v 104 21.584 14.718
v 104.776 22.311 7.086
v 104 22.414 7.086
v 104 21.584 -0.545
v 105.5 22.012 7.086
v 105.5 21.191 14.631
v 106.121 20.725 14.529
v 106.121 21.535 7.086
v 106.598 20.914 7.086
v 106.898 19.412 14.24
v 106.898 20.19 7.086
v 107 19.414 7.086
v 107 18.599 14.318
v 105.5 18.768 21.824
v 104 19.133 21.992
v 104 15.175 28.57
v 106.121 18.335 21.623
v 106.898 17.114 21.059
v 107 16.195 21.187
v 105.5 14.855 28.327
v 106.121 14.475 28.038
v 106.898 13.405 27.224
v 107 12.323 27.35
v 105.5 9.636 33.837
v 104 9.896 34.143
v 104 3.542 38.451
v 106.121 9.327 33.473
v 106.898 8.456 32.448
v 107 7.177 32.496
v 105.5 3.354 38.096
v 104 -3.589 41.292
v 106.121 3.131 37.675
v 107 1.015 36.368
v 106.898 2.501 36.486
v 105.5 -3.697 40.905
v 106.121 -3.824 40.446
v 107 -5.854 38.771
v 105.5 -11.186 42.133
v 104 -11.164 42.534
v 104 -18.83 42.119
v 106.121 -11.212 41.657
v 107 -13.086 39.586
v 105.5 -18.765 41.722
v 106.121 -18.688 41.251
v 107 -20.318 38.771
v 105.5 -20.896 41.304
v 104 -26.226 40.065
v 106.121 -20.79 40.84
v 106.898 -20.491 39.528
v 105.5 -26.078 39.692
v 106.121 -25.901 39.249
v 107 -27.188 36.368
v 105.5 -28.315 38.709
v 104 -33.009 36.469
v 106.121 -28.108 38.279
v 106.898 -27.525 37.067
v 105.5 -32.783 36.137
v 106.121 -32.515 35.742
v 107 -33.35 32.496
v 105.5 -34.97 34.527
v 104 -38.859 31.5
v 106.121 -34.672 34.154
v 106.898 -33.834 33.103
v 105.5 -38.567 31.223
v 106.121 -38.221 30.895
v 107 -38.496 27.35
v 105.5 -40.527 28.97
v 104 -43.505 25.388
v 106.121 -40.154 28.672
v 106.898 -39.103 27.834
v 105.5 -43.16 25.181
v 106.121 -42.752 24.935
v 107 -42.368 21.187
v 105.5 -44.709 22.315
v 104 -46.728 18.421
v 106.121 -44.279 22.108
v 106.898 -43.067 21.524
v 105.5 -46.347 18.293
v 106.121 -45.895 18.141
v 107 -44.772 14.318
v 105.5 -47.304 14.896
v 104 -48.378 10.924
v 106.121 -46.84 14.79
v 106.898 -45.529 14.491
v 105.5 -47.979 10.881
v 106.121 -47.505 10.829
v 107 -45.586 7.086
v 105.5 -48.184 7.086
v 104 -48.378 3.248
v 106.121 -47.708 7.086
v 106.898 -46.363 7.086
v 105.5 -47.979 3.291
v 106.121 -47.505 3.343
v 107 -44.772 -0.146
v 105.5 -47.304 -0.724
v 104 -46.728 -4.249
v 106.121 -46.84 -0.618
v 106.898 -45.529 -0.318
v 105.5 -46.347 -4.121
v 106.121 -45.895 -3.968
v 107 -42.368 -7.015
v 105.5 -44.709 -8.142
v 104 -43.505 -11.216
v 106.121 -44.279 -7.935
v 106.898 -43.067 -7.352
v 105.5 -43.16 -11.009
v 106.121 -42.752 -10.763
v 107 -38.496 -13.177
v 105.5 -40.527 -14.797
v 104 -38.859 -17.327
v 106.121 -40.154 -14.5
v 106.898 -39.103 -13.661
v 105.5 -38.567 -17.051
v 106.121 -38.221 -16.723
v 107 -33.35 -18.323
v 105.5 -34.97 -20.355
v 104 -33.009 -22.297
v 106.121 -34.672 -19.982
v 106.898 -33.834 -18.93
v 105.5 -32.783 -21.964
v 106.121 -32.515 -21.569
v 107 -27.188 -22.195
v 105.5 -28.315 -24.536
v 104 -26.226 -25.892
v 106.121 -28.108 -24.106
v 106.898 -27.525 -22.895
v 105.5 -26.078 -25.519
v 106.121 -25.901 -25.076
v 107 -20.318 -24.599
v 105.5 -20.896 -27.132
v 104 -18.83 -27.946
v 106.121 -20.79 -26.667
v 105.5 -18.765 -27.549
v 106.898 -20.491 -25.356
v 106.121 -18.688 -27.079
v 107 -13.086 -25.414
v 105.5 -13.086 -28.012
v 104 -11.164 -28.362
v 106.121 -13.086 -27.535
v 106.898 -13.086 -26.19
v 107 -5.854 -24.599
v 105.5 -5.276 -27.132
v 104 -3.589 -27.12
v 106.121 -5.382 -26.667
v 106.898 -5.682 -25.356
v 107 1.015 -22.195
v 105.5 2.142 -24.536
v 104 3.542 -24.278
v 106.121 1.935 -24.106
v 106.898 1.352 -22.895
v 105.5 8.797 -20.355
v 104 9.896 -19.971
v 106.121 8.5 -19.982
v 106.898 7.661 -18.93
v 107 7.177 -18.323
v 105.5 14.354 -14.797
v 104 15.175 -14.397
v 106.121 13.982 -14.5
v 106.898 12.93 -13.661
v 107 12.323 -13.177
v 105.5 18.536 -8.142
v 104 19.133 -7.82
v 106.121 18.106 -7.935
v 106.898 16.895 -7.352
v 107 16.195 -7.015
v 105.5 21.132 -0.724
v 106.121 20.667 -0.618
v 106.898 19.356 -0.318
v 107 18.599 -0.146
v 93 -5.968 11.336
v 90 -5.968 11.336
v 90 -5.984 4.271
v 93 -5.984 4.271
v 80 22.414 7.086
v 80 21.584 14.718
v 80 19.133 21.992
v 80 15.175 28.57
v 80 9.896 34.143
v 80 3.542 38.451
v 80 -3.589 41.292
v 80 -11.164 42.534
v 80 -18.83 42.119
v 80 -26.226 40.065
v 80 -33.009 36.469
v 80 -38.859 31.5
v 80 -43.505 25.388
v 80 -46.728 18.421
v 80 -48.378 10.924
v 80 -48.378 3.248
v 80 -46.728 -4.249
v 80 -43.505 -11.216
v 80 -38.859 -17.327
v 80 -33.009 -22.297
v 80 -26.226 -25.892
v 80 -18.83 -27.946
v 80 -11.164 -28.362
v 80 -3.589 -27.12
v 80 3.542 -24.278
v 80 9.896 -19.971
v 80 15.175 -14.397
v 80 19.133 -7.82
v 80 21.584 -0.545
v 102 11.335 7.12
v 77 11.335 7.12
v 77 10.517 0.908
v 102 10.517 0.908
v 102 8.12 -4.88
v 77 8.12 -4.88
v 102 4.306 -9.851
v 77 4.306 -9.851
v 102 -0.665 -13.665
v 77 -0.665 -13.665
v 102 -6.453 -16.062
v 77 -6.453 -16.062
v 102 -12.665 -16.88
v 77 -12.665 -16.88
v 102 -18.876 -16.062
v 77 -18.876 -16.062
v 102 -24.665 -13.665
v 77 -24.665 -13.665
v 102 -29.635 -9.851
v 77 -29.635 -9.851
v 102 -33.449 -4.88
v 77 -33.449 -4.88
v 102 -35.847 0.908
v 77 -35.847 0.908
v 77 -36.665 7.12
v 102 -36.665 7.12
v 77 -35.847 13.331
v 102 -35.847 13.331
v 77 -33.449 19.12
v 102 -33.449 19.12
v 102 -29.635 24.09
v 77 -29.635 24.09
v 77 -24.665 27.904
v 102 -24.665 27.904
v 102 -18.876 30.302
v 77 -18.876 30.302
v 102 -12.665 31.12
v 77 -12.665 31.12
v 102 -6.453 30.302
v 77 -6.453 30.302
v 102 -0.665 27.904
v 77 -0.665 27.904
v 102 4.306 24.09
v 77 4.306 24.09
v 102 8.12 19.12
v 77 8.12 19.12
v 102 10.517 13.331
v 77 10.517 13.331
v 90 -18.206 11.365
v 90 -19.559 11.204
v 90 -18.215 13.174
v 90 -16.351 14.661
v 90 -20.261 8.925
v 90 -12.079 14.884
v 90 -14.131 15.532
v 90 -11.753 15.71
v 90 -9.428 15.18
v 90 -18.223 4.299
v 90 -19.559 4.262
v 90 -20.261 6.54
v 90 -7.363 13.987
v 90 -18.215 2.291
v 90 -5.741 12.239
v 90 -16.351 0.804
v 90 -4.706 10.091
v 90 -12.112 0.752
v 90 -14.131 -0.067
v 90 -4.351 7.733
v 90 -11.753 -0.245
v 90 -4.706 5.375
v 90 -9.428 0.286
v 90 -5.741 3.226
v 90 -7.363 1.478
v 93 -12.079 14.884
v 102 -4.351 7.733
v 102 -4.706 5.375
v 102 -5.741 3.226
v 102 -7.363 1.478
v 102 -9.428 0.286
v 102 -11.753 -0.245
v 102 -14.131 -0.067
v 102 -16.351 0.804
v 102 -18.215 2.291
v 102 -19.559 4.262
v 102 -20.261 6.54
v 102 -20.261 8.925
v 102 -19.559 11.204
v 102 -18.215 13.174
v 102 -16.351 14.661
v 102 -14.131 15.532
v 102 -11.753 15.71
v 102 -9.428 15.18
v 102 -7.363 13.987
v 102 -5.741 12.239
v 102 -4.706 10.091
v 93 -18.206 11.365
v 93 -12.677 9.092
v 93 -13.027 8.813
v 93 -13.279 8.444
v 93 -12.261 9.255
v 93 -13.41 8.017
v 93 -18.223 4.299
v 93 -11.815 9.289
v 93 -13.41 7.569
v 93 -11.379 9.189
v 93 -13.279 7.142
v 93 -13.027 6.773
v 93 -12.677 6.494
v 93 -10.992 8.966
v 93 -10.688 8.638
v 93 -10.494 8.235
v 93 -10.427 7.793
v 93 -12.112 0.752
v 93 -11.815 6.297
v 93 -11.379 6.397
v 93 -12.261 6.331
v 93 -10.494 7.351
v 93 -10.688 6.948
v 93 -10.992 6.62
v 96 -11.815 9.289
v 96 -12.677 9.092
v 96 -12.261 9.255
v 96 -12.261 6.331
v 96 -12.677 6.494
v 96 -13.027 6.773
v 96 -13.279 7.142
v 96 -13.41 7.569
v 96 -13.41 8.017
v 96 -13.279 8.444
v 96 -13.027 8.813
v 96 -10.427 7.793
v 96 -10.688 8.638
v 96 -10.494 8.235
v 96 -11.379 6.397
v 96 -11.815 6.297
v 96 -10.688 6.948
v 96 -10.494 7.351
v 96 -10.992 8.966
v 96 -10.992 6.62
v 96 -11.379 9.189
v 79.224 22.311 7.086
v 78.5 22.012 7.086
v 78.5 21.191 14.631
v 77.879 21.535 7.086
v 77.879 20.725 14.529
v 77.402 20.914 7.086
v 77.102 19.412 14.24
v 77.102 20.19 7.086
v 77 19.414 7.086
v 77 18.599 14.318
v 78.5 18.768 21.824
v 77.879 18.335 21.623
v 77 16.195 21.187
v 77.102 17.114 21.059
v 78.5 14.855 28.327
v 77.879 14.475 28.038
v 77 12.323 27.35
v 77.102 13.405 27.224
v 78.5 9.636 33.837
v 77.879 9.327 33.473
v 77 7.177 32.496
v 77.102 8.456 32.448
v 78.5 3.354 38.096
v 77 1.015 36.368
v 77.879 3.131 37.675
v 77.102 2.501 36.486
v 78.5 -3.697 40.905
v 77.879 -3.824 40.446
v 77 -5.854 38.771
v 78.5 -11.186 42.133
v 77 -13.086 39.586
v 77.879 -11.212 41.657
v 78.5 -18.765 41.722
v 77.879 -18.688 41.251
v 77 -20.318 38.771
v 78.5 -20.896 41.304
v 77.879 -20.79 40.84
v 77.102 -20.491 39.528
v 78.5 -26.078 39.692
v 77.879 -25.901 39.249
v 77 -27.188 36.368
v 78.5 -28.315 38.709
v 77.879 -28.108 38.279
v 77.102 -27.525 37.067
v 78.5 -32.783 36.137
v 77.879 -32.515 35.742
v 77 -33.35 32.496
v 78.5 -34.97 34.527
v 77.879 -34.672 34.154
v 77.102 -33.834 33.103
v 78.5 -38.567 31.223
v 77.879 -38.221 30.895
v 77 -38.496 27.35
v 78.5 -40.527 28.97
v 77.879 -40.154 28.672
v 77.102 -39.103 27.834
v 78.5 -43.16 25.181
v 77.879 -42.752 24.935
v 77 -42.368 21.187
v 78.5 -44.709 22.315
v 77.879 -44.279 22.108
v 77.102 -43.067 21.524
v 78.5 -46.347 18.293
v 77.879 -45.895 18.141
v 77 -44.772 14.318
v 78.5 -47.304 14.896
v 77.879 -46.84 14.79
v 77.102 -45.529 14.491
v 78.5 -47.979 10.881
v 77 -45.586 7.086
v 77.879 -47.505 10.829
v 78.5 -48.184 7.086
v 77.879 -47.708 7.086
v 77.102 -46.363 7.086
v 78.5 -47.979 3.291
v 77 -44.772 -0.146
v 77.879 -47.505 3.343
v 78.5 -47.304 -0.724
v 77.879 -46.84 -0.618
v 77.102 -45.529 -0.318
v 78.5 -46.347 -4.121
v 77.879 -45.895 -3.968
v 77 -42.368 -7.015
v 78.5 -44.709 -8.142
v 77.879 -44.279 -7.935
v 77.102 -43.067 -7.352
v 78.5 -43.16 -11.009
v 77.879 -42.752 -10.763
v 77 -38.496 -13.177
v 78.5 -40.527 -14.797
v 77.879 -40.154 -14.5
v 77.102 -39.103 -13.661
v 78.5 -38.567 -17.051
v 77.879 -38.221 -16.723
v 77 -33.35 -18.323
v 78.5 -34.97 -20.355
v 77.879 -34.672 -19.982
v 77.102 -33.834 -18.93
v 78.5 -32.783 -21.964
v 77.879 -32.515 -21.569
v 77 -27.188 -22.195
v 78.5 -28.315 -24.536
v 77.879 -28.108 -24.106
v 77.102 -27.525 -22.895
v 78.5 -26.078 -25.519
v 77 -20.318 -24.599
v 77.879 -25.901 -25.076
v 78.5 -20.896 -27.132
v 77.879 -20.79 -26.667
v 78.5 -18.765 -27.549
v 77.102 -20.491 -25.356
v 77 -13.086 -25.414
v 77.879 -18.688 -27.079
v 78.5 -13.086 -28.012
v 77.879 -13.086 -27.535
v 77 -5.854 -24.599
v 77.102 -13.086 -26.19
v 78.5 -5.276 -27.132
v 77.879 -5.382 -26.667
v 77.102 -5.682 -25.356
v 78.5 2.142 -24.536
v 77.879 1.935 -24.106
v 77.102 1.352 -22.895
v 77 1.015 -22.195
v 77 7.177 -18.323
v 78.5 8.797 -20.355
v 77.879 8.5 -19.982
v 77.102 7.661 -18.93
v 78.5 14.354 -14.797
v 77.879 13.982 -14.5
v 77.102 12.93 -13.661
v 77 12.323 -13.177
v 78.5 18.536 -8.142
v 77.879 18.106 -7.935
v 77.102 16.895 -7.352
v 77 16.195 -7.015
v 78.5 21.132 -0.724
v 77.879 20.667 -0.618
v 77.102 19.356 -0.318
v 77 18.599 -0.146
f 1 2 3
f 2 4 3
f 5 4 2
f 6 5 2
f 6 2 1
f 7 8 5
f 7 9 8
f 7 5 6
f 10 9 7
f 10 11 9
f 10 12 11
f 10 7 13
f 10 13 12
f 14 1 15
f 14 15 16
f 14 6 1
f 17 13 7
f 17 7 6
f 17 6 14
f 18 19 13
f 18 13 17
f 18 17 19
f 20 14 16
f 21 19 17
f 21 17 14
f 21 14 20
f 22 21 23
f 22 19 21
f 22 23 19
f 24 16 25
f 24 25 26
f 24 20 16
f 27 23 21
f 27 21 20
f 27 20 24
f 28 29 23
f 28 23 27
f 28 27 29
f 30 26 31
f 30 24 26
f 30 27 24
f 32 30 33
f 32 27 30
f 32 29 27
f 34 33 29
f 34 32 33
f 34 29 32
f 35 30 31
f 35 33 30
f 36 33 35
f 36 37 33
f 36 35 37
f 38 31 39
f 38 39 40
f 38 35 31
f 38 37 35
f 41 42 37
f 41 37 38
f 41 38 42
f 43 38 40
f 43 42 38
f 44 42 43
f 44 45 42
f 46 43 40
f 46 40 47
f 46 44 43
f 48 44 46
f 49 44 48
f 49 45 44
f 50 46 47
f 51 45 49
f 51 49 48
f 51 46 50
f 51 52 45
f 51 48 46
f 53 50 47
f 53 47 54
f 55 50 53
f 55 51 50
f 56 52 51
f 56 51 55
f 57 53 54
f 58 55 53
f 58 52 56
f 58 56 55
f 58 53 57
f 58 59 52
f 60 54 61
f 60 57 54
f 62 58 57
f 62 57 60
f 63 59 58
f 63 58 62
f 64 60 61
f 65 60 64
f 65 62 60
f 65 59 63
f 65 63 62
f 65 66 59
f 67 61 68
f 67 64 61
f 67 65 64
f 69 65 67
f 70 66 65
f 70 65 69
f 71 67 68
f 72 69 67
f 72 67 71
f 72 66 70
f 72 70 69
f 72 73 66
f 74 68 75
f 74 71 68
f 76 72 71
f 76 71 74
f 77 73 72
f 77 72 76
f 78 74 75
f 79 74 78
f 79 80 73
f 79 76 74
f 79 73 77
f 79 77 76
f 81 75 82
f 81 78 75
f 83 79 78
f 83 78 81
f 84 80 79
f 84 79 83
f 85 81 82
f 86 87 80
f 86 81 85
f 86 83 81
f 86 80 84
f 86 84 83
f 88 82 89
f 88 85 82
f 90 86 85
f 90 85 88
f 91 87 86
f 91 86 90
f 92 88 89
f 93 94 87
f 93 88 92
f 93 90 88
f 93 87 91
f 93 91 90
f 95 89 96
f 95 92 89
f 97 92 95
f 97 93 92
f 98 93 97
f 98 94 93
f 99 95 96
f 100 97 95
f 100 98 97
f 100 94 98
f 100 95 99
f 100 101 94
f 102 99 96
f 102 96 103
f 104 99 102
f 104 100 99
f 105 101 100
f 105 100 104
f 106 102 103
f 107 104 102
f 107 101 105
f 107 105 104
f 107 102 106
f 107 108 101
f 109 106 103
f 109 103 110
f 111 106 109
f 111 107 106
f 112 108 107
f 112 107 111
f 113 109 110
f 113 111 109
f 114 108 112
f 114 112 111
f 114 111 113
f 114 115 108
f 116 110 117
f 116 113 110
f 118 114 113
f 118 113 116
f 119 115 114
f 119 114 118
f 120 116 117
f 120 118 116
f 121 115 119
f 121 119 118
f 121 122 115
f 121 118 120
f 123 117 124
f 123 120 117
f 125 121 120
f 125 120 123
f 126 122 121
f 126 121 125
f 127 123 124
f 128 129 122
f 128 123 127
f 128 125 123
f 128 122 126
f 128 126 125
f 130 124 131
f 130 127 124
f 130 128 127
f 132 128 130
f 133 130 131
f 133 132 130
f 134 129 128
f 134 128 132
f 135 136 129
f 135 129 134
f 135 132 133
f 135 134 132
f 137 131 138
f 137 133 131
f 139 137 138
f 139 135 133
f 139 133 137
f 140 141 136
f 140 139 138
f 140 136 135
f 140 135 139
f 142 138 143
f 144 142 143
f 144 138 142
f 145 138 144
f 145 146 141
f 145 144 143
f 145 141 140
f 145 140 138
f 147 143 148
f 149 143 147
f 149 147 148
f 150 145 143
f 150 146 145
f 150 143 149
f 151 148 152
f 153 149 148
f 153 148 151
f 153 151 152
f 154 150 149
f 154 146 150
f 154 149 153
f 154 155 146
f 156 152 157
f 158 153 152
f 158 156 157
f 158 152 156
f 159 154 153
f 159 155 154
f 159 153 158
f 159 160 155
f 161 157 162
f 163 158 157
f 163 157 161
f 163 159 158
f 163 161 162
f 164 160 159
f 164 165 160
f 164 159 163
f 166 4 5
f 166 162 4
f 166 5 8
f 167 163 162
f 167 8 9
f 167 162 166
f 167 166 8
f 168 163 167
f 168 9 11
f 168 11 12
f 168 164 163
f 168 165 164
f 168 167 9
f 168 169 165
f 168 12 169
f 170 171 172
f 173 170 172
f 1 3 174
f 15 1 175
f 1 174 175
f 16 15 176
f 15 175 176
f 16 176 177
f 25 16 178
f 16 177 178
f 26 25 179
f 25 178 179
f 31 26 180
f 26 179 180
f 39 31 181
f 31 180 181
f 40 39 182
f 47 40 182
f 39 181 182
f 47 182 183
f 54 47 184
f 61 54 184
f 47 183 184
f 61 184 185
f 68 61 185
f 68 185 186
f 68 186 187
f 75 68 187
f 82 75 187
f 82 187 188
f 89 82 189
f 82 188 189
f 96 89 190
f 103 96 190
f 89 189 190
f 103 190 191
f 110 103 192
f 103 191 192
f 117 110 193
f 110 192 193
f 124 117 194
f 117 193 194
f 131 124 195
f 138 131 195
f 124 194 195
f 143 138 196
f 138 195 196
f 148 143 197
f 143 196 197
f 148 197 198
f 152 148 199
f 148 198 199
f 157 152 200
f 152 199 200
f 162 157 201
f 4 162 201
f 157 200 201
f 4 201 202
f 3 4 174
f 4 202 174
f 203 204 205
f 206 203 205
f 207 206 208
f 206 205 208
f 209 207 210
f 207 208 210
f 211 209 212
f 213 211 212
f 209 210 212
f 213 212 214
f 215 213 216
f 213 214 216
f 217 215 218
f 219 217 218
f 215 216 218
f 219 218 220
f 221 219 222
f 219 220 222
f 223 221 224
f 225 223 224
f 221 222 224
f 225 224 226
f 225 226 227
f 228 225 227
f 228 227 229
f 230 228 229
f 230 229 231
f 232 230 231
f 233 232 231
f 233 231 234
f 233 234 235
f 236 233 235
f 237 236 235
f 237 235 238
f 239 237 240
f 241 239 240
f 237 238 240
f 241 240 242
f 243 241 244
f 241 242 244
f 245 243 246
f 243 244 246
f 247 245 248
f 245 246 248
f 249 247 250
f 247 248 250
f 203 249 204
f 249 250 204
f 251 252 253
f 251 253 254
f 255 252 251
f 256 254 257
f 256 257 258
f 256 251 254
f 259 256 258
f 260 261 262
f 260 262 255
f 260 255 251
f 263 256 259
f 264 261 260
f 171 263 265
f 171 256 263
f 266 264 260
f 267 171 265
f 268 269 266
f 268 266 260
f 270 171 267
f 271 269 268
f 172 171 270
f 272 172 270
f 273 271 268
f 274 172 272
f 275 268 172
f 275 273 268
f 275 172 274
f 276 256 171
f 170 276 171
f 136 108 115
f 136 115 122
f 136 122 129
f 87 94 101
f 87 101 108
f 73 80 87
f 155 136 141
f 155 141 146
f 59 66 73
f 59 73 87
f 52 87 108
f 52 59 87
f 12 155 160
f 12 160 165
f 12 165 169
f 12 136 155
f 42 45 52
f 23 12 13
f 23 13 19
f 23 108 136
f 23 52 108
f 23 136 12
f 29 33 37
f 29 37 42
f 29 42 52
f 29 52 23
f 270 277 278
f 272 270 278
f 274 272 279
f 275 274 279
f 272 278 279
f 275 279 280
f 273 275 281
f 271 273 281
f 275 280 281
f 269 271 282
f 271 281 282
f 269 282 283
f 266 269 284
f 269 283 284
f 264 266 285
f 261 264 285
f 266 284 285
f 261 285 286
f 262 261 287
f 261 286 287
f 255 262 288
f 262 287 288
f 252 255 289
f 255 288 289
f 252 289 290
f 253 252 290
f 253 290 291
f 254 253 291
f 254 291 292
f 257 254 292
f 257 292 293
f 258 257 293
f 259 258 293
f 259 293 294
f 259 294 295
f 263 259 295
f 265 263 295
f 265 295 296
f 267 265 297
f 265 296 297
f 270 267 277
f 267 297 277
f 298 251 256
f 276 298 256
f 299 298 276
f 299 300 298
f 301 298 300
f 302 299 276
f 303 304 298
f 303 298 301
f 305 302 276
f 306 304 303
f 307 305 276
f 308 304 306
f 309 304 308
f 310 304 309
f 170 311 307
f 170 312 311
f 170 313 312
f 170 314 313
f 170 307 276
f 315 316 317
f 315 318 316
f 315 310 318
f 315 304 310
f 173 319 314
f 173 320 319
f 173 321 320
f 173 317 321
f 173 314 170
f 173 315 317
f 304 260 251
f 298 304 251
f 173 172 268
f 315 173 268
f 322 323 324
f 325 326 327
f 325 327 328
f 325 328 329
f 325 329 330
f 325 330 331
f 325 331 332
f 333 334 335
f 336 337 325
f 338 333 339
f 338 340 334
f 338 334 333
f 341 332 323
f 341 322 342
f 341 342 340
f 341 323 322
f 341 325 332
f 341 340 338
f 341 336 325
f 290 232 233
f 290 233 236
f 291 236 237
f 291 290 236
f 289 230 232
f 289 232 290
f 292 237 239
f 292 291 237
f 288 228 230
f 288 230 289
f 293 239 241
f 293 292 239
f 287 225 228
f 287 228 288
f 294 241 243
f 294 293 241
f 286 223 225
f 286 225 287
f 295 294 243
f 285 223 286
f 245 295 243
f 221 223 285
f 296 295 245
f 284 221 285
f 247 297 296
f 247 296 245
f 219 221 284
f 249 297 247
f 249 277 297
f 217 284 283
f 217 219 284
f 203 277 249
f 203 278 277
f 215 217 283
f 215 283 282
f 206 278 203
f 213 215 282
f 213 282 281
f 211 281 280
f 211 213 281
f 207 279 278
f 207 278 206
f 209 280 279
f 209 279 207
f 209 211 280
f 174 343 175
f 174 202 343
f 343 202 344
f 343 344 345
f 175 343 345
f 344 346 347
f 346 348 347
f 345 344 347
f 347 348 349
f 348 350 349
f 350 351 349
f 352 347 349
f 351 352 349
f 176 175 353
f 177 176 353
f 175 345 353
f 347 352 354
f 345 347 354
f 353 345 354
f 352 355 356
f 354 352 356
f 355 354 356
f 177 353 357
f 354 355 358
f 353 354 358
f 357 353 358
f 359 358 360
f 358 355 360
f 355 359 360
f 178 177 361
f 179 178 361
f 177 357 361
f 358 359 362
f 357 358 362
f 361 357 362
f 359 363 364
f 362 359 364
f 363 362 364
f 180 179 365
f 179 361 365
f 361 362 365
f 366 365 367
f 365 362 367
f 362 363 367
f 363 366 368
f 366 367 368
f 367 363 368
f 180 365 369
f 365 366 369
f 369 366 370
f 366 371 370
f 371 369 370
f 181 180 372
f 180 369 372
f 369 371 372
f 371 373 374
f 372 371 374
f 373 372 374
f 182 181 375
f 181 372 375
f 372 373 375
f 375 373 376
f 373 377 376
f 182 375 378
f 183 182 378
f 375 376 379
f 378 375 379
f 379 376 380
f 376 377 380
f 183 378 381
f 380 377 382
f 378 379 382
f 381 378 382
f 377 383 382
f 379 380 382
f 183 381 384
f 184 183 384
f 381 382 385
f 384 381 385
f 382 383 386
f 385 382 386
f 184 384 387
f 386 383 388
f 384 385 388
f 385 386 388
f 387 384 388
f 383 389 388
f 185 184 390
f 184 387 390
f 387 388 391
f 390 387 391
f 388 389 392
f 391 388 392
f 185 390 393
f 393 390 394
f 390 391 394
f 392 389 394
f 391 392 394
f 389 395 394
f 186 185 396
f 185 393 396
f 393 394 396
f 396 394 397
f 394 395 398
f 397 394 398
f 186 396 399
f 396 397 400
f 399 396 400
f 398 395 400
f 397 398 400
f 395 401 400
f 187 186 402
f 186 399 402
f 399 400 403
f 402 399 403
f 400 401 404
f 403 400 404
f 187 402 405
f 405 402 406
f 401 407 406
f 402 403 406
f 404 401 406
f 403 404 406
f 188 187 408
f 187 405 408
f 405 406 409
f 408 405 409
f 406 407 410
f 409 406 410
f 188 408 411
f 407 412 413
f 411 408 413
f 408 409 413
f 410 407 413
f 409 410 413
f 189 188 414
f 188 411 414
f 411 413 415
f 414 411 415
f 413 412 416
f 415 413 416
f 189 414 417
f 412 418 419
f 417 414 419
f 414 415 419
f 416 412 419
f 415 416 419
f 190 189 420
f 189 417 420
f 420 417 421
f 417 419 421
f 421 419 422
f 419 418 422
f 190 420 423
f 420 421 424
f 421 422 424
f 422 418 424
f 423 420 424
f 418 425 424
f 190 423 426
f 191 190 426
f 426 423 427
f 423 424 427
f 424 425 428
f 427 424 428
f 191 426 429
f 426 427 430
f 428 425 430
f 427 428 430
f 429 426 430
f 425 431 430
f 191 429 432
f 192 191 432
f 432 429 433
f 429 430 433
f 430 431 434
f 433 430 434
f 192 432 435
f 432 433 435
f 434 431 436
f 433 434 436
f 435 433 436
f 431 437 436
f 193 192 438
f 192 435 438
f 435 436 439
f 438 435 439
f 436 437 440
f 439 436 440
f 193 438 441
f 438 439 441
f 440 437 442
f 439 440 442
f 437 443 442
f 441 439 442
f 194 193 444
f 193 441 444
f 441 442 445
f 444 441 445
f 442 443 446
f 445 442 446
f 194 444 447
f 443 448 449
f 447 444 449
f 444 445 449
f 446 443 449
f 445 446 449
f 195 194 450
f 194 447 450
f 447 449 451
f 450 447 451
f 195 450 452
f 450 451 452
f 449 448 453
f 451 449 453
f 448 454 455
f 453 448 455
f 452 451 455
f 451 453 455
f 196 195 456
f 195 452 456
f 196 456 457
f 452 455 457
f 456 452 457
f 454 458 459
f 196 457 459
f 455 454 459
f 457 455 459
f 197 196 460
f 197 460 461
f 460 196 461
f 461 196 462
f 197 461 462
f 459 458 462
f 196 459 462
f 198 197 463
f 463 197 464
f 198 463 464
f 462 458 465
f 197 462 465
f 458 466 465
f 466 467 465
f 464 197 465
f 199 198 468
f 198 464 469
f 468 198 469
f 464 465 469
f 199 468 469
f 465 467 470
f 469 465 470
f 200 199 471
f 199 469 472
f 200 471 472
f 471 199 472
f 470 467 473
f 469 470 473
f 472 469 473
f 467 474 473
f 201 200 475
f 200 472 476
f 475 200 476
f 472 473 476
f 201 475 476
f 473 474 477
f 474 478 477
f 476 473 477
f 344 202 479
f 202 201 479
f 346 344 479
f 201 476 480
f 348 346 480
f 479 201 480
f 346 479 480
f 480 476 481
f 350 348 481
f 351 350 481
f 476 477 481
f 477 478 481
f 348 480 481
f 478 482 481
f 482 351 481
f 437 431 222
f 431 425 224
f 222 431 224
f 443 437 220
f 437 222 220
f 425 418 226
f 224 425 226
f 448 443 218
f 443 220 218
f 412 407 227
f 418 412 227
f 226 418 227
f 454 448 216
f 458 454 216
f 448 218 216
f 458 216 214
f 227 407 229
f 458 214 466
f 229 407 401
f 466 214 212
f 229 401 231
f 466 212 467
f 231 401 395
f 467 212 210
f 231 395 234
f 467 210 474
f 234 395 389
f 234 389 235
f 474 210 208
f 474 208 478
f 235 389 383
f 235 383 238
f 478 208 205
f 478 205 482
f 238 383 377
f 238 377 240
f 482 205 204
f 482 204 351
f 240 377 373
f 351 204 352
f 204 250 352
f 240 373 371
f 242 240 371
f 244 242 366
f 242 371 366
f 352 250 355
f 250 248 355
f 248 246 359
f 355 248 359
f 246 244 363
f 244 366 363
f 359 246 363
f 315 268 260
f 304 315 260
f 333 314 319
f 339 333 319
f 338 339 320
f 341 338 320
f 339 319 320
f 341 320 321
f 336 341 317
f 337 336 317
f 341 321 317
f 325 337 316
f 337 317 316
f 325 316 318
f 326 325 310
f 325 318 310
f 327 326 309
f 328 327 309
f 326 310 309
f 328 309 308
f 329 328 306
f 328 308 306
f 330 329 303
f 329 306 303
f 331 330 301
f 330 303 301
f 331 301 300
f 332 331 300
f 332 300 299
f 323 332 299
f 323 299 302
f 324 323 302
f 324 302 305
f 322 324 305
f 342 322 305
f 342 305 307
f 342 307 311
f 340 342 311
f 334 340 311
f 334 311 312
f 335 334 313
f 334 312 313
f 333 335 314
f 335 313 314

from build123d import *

# Parameters (mm, degrees)
SKETCH030_R     = 35.5
PAD012_DEPTH    = 30
SKETCH031_R     = 24
POCKET_DEPTH    = 25
SKETCH032_R     = 8
PAD013_DEPTH    = 12
POCKET001_DEPTH = 3
SKETCH004_R     = 1.5
POCKET002_DEPTH = 3
FILLET016_R     = 3
FILLET017_R     = 3


with BuildPart() as part:
    # Sketch030 → Pad012 (new body)
    with BuildSketch(Plane.YZ):
        with Locations((-2.086398, 2.086246)):
            Circle(SKETCH030_R)
    extrude(amount=PAD012_DEPTH)

    # Sketch031 (on Face2 of Pad012) → Pocket (cut)
    with BuildSketch(Plane(origin=(0, 0, 0), x_dir=(0, 1, 0), z_dir=(-1, 0, 0))):
        with Locations((-1.664763, -2.119737)):
            Circle(SKETCH031_R)
    extrude(amount=-POCKET_DEPTH, mode=Mode.SUBTRACT)

    # Sketch032 (on Face5 of Pocket) → Pad013 (join)
    with BuildSketch(Plane(origin=(25, 0, 0), x_dir=(0, 1, 0), z_dir=(-1, 0, 0))):
        with Locations((-1.350817, -2.732668)):
            Circle(SKETCH032_R)
    extrude(amount=PAD013_DEPTH)

    # Sketch033 (on Face7 of Pad013) → Pocket001 (cut)
    with BuildSketch(Plane(origin=(13, 0, 0), x_dir=(0, 1, 0), z_dir=(-1, 0, 0))):
        Polygon((-1.111872, 4.248012), (-7.222761, 0.700721), (-7.206161, -6.365109), (-1.078672, -9.883648), (5.032216, -6.336357), (5.015616, 0.729474), align=None)
    extrude(amount=-POCKET001_DEPTH, mode=Mode.SUBTRACT)

    # Sketch004 (on Face14 of Pocket001) → Pocket002 (cut)
    with BuildSketch(Plane(origin=(16, 0, 0), x_dir=(0, 1, 0), z_dir=(-1, 0, 0))):
        with Locations((-0.927213, -2.793039)):
            Circle(SKETCH004_R)
    extrude(amount=-POCKET002_DEPTH, mode=Mode.SUBTRACT)

    # Fillet016
    fillet016_edges = [part.edges().sort_by_distance(p)[0] for p in [
        (0, -37.586398, 2.086246),
    ]]
    fillet(fillet016_edges, radius=FILLET016_R)

    # Fillet017
    fillet017_edges = [part.edges().sort_by_distance(p)[0] for p in [
        (30, -37.586398, 2.086246),
    ]]
    fillet(fillet017_edges, radius=FILLET017_R)


with BuildPart() as part_1:
    # Body001 placement: moved
    add(part.part.moved(Location((77, -11, 5))))


solid = part_1.part
